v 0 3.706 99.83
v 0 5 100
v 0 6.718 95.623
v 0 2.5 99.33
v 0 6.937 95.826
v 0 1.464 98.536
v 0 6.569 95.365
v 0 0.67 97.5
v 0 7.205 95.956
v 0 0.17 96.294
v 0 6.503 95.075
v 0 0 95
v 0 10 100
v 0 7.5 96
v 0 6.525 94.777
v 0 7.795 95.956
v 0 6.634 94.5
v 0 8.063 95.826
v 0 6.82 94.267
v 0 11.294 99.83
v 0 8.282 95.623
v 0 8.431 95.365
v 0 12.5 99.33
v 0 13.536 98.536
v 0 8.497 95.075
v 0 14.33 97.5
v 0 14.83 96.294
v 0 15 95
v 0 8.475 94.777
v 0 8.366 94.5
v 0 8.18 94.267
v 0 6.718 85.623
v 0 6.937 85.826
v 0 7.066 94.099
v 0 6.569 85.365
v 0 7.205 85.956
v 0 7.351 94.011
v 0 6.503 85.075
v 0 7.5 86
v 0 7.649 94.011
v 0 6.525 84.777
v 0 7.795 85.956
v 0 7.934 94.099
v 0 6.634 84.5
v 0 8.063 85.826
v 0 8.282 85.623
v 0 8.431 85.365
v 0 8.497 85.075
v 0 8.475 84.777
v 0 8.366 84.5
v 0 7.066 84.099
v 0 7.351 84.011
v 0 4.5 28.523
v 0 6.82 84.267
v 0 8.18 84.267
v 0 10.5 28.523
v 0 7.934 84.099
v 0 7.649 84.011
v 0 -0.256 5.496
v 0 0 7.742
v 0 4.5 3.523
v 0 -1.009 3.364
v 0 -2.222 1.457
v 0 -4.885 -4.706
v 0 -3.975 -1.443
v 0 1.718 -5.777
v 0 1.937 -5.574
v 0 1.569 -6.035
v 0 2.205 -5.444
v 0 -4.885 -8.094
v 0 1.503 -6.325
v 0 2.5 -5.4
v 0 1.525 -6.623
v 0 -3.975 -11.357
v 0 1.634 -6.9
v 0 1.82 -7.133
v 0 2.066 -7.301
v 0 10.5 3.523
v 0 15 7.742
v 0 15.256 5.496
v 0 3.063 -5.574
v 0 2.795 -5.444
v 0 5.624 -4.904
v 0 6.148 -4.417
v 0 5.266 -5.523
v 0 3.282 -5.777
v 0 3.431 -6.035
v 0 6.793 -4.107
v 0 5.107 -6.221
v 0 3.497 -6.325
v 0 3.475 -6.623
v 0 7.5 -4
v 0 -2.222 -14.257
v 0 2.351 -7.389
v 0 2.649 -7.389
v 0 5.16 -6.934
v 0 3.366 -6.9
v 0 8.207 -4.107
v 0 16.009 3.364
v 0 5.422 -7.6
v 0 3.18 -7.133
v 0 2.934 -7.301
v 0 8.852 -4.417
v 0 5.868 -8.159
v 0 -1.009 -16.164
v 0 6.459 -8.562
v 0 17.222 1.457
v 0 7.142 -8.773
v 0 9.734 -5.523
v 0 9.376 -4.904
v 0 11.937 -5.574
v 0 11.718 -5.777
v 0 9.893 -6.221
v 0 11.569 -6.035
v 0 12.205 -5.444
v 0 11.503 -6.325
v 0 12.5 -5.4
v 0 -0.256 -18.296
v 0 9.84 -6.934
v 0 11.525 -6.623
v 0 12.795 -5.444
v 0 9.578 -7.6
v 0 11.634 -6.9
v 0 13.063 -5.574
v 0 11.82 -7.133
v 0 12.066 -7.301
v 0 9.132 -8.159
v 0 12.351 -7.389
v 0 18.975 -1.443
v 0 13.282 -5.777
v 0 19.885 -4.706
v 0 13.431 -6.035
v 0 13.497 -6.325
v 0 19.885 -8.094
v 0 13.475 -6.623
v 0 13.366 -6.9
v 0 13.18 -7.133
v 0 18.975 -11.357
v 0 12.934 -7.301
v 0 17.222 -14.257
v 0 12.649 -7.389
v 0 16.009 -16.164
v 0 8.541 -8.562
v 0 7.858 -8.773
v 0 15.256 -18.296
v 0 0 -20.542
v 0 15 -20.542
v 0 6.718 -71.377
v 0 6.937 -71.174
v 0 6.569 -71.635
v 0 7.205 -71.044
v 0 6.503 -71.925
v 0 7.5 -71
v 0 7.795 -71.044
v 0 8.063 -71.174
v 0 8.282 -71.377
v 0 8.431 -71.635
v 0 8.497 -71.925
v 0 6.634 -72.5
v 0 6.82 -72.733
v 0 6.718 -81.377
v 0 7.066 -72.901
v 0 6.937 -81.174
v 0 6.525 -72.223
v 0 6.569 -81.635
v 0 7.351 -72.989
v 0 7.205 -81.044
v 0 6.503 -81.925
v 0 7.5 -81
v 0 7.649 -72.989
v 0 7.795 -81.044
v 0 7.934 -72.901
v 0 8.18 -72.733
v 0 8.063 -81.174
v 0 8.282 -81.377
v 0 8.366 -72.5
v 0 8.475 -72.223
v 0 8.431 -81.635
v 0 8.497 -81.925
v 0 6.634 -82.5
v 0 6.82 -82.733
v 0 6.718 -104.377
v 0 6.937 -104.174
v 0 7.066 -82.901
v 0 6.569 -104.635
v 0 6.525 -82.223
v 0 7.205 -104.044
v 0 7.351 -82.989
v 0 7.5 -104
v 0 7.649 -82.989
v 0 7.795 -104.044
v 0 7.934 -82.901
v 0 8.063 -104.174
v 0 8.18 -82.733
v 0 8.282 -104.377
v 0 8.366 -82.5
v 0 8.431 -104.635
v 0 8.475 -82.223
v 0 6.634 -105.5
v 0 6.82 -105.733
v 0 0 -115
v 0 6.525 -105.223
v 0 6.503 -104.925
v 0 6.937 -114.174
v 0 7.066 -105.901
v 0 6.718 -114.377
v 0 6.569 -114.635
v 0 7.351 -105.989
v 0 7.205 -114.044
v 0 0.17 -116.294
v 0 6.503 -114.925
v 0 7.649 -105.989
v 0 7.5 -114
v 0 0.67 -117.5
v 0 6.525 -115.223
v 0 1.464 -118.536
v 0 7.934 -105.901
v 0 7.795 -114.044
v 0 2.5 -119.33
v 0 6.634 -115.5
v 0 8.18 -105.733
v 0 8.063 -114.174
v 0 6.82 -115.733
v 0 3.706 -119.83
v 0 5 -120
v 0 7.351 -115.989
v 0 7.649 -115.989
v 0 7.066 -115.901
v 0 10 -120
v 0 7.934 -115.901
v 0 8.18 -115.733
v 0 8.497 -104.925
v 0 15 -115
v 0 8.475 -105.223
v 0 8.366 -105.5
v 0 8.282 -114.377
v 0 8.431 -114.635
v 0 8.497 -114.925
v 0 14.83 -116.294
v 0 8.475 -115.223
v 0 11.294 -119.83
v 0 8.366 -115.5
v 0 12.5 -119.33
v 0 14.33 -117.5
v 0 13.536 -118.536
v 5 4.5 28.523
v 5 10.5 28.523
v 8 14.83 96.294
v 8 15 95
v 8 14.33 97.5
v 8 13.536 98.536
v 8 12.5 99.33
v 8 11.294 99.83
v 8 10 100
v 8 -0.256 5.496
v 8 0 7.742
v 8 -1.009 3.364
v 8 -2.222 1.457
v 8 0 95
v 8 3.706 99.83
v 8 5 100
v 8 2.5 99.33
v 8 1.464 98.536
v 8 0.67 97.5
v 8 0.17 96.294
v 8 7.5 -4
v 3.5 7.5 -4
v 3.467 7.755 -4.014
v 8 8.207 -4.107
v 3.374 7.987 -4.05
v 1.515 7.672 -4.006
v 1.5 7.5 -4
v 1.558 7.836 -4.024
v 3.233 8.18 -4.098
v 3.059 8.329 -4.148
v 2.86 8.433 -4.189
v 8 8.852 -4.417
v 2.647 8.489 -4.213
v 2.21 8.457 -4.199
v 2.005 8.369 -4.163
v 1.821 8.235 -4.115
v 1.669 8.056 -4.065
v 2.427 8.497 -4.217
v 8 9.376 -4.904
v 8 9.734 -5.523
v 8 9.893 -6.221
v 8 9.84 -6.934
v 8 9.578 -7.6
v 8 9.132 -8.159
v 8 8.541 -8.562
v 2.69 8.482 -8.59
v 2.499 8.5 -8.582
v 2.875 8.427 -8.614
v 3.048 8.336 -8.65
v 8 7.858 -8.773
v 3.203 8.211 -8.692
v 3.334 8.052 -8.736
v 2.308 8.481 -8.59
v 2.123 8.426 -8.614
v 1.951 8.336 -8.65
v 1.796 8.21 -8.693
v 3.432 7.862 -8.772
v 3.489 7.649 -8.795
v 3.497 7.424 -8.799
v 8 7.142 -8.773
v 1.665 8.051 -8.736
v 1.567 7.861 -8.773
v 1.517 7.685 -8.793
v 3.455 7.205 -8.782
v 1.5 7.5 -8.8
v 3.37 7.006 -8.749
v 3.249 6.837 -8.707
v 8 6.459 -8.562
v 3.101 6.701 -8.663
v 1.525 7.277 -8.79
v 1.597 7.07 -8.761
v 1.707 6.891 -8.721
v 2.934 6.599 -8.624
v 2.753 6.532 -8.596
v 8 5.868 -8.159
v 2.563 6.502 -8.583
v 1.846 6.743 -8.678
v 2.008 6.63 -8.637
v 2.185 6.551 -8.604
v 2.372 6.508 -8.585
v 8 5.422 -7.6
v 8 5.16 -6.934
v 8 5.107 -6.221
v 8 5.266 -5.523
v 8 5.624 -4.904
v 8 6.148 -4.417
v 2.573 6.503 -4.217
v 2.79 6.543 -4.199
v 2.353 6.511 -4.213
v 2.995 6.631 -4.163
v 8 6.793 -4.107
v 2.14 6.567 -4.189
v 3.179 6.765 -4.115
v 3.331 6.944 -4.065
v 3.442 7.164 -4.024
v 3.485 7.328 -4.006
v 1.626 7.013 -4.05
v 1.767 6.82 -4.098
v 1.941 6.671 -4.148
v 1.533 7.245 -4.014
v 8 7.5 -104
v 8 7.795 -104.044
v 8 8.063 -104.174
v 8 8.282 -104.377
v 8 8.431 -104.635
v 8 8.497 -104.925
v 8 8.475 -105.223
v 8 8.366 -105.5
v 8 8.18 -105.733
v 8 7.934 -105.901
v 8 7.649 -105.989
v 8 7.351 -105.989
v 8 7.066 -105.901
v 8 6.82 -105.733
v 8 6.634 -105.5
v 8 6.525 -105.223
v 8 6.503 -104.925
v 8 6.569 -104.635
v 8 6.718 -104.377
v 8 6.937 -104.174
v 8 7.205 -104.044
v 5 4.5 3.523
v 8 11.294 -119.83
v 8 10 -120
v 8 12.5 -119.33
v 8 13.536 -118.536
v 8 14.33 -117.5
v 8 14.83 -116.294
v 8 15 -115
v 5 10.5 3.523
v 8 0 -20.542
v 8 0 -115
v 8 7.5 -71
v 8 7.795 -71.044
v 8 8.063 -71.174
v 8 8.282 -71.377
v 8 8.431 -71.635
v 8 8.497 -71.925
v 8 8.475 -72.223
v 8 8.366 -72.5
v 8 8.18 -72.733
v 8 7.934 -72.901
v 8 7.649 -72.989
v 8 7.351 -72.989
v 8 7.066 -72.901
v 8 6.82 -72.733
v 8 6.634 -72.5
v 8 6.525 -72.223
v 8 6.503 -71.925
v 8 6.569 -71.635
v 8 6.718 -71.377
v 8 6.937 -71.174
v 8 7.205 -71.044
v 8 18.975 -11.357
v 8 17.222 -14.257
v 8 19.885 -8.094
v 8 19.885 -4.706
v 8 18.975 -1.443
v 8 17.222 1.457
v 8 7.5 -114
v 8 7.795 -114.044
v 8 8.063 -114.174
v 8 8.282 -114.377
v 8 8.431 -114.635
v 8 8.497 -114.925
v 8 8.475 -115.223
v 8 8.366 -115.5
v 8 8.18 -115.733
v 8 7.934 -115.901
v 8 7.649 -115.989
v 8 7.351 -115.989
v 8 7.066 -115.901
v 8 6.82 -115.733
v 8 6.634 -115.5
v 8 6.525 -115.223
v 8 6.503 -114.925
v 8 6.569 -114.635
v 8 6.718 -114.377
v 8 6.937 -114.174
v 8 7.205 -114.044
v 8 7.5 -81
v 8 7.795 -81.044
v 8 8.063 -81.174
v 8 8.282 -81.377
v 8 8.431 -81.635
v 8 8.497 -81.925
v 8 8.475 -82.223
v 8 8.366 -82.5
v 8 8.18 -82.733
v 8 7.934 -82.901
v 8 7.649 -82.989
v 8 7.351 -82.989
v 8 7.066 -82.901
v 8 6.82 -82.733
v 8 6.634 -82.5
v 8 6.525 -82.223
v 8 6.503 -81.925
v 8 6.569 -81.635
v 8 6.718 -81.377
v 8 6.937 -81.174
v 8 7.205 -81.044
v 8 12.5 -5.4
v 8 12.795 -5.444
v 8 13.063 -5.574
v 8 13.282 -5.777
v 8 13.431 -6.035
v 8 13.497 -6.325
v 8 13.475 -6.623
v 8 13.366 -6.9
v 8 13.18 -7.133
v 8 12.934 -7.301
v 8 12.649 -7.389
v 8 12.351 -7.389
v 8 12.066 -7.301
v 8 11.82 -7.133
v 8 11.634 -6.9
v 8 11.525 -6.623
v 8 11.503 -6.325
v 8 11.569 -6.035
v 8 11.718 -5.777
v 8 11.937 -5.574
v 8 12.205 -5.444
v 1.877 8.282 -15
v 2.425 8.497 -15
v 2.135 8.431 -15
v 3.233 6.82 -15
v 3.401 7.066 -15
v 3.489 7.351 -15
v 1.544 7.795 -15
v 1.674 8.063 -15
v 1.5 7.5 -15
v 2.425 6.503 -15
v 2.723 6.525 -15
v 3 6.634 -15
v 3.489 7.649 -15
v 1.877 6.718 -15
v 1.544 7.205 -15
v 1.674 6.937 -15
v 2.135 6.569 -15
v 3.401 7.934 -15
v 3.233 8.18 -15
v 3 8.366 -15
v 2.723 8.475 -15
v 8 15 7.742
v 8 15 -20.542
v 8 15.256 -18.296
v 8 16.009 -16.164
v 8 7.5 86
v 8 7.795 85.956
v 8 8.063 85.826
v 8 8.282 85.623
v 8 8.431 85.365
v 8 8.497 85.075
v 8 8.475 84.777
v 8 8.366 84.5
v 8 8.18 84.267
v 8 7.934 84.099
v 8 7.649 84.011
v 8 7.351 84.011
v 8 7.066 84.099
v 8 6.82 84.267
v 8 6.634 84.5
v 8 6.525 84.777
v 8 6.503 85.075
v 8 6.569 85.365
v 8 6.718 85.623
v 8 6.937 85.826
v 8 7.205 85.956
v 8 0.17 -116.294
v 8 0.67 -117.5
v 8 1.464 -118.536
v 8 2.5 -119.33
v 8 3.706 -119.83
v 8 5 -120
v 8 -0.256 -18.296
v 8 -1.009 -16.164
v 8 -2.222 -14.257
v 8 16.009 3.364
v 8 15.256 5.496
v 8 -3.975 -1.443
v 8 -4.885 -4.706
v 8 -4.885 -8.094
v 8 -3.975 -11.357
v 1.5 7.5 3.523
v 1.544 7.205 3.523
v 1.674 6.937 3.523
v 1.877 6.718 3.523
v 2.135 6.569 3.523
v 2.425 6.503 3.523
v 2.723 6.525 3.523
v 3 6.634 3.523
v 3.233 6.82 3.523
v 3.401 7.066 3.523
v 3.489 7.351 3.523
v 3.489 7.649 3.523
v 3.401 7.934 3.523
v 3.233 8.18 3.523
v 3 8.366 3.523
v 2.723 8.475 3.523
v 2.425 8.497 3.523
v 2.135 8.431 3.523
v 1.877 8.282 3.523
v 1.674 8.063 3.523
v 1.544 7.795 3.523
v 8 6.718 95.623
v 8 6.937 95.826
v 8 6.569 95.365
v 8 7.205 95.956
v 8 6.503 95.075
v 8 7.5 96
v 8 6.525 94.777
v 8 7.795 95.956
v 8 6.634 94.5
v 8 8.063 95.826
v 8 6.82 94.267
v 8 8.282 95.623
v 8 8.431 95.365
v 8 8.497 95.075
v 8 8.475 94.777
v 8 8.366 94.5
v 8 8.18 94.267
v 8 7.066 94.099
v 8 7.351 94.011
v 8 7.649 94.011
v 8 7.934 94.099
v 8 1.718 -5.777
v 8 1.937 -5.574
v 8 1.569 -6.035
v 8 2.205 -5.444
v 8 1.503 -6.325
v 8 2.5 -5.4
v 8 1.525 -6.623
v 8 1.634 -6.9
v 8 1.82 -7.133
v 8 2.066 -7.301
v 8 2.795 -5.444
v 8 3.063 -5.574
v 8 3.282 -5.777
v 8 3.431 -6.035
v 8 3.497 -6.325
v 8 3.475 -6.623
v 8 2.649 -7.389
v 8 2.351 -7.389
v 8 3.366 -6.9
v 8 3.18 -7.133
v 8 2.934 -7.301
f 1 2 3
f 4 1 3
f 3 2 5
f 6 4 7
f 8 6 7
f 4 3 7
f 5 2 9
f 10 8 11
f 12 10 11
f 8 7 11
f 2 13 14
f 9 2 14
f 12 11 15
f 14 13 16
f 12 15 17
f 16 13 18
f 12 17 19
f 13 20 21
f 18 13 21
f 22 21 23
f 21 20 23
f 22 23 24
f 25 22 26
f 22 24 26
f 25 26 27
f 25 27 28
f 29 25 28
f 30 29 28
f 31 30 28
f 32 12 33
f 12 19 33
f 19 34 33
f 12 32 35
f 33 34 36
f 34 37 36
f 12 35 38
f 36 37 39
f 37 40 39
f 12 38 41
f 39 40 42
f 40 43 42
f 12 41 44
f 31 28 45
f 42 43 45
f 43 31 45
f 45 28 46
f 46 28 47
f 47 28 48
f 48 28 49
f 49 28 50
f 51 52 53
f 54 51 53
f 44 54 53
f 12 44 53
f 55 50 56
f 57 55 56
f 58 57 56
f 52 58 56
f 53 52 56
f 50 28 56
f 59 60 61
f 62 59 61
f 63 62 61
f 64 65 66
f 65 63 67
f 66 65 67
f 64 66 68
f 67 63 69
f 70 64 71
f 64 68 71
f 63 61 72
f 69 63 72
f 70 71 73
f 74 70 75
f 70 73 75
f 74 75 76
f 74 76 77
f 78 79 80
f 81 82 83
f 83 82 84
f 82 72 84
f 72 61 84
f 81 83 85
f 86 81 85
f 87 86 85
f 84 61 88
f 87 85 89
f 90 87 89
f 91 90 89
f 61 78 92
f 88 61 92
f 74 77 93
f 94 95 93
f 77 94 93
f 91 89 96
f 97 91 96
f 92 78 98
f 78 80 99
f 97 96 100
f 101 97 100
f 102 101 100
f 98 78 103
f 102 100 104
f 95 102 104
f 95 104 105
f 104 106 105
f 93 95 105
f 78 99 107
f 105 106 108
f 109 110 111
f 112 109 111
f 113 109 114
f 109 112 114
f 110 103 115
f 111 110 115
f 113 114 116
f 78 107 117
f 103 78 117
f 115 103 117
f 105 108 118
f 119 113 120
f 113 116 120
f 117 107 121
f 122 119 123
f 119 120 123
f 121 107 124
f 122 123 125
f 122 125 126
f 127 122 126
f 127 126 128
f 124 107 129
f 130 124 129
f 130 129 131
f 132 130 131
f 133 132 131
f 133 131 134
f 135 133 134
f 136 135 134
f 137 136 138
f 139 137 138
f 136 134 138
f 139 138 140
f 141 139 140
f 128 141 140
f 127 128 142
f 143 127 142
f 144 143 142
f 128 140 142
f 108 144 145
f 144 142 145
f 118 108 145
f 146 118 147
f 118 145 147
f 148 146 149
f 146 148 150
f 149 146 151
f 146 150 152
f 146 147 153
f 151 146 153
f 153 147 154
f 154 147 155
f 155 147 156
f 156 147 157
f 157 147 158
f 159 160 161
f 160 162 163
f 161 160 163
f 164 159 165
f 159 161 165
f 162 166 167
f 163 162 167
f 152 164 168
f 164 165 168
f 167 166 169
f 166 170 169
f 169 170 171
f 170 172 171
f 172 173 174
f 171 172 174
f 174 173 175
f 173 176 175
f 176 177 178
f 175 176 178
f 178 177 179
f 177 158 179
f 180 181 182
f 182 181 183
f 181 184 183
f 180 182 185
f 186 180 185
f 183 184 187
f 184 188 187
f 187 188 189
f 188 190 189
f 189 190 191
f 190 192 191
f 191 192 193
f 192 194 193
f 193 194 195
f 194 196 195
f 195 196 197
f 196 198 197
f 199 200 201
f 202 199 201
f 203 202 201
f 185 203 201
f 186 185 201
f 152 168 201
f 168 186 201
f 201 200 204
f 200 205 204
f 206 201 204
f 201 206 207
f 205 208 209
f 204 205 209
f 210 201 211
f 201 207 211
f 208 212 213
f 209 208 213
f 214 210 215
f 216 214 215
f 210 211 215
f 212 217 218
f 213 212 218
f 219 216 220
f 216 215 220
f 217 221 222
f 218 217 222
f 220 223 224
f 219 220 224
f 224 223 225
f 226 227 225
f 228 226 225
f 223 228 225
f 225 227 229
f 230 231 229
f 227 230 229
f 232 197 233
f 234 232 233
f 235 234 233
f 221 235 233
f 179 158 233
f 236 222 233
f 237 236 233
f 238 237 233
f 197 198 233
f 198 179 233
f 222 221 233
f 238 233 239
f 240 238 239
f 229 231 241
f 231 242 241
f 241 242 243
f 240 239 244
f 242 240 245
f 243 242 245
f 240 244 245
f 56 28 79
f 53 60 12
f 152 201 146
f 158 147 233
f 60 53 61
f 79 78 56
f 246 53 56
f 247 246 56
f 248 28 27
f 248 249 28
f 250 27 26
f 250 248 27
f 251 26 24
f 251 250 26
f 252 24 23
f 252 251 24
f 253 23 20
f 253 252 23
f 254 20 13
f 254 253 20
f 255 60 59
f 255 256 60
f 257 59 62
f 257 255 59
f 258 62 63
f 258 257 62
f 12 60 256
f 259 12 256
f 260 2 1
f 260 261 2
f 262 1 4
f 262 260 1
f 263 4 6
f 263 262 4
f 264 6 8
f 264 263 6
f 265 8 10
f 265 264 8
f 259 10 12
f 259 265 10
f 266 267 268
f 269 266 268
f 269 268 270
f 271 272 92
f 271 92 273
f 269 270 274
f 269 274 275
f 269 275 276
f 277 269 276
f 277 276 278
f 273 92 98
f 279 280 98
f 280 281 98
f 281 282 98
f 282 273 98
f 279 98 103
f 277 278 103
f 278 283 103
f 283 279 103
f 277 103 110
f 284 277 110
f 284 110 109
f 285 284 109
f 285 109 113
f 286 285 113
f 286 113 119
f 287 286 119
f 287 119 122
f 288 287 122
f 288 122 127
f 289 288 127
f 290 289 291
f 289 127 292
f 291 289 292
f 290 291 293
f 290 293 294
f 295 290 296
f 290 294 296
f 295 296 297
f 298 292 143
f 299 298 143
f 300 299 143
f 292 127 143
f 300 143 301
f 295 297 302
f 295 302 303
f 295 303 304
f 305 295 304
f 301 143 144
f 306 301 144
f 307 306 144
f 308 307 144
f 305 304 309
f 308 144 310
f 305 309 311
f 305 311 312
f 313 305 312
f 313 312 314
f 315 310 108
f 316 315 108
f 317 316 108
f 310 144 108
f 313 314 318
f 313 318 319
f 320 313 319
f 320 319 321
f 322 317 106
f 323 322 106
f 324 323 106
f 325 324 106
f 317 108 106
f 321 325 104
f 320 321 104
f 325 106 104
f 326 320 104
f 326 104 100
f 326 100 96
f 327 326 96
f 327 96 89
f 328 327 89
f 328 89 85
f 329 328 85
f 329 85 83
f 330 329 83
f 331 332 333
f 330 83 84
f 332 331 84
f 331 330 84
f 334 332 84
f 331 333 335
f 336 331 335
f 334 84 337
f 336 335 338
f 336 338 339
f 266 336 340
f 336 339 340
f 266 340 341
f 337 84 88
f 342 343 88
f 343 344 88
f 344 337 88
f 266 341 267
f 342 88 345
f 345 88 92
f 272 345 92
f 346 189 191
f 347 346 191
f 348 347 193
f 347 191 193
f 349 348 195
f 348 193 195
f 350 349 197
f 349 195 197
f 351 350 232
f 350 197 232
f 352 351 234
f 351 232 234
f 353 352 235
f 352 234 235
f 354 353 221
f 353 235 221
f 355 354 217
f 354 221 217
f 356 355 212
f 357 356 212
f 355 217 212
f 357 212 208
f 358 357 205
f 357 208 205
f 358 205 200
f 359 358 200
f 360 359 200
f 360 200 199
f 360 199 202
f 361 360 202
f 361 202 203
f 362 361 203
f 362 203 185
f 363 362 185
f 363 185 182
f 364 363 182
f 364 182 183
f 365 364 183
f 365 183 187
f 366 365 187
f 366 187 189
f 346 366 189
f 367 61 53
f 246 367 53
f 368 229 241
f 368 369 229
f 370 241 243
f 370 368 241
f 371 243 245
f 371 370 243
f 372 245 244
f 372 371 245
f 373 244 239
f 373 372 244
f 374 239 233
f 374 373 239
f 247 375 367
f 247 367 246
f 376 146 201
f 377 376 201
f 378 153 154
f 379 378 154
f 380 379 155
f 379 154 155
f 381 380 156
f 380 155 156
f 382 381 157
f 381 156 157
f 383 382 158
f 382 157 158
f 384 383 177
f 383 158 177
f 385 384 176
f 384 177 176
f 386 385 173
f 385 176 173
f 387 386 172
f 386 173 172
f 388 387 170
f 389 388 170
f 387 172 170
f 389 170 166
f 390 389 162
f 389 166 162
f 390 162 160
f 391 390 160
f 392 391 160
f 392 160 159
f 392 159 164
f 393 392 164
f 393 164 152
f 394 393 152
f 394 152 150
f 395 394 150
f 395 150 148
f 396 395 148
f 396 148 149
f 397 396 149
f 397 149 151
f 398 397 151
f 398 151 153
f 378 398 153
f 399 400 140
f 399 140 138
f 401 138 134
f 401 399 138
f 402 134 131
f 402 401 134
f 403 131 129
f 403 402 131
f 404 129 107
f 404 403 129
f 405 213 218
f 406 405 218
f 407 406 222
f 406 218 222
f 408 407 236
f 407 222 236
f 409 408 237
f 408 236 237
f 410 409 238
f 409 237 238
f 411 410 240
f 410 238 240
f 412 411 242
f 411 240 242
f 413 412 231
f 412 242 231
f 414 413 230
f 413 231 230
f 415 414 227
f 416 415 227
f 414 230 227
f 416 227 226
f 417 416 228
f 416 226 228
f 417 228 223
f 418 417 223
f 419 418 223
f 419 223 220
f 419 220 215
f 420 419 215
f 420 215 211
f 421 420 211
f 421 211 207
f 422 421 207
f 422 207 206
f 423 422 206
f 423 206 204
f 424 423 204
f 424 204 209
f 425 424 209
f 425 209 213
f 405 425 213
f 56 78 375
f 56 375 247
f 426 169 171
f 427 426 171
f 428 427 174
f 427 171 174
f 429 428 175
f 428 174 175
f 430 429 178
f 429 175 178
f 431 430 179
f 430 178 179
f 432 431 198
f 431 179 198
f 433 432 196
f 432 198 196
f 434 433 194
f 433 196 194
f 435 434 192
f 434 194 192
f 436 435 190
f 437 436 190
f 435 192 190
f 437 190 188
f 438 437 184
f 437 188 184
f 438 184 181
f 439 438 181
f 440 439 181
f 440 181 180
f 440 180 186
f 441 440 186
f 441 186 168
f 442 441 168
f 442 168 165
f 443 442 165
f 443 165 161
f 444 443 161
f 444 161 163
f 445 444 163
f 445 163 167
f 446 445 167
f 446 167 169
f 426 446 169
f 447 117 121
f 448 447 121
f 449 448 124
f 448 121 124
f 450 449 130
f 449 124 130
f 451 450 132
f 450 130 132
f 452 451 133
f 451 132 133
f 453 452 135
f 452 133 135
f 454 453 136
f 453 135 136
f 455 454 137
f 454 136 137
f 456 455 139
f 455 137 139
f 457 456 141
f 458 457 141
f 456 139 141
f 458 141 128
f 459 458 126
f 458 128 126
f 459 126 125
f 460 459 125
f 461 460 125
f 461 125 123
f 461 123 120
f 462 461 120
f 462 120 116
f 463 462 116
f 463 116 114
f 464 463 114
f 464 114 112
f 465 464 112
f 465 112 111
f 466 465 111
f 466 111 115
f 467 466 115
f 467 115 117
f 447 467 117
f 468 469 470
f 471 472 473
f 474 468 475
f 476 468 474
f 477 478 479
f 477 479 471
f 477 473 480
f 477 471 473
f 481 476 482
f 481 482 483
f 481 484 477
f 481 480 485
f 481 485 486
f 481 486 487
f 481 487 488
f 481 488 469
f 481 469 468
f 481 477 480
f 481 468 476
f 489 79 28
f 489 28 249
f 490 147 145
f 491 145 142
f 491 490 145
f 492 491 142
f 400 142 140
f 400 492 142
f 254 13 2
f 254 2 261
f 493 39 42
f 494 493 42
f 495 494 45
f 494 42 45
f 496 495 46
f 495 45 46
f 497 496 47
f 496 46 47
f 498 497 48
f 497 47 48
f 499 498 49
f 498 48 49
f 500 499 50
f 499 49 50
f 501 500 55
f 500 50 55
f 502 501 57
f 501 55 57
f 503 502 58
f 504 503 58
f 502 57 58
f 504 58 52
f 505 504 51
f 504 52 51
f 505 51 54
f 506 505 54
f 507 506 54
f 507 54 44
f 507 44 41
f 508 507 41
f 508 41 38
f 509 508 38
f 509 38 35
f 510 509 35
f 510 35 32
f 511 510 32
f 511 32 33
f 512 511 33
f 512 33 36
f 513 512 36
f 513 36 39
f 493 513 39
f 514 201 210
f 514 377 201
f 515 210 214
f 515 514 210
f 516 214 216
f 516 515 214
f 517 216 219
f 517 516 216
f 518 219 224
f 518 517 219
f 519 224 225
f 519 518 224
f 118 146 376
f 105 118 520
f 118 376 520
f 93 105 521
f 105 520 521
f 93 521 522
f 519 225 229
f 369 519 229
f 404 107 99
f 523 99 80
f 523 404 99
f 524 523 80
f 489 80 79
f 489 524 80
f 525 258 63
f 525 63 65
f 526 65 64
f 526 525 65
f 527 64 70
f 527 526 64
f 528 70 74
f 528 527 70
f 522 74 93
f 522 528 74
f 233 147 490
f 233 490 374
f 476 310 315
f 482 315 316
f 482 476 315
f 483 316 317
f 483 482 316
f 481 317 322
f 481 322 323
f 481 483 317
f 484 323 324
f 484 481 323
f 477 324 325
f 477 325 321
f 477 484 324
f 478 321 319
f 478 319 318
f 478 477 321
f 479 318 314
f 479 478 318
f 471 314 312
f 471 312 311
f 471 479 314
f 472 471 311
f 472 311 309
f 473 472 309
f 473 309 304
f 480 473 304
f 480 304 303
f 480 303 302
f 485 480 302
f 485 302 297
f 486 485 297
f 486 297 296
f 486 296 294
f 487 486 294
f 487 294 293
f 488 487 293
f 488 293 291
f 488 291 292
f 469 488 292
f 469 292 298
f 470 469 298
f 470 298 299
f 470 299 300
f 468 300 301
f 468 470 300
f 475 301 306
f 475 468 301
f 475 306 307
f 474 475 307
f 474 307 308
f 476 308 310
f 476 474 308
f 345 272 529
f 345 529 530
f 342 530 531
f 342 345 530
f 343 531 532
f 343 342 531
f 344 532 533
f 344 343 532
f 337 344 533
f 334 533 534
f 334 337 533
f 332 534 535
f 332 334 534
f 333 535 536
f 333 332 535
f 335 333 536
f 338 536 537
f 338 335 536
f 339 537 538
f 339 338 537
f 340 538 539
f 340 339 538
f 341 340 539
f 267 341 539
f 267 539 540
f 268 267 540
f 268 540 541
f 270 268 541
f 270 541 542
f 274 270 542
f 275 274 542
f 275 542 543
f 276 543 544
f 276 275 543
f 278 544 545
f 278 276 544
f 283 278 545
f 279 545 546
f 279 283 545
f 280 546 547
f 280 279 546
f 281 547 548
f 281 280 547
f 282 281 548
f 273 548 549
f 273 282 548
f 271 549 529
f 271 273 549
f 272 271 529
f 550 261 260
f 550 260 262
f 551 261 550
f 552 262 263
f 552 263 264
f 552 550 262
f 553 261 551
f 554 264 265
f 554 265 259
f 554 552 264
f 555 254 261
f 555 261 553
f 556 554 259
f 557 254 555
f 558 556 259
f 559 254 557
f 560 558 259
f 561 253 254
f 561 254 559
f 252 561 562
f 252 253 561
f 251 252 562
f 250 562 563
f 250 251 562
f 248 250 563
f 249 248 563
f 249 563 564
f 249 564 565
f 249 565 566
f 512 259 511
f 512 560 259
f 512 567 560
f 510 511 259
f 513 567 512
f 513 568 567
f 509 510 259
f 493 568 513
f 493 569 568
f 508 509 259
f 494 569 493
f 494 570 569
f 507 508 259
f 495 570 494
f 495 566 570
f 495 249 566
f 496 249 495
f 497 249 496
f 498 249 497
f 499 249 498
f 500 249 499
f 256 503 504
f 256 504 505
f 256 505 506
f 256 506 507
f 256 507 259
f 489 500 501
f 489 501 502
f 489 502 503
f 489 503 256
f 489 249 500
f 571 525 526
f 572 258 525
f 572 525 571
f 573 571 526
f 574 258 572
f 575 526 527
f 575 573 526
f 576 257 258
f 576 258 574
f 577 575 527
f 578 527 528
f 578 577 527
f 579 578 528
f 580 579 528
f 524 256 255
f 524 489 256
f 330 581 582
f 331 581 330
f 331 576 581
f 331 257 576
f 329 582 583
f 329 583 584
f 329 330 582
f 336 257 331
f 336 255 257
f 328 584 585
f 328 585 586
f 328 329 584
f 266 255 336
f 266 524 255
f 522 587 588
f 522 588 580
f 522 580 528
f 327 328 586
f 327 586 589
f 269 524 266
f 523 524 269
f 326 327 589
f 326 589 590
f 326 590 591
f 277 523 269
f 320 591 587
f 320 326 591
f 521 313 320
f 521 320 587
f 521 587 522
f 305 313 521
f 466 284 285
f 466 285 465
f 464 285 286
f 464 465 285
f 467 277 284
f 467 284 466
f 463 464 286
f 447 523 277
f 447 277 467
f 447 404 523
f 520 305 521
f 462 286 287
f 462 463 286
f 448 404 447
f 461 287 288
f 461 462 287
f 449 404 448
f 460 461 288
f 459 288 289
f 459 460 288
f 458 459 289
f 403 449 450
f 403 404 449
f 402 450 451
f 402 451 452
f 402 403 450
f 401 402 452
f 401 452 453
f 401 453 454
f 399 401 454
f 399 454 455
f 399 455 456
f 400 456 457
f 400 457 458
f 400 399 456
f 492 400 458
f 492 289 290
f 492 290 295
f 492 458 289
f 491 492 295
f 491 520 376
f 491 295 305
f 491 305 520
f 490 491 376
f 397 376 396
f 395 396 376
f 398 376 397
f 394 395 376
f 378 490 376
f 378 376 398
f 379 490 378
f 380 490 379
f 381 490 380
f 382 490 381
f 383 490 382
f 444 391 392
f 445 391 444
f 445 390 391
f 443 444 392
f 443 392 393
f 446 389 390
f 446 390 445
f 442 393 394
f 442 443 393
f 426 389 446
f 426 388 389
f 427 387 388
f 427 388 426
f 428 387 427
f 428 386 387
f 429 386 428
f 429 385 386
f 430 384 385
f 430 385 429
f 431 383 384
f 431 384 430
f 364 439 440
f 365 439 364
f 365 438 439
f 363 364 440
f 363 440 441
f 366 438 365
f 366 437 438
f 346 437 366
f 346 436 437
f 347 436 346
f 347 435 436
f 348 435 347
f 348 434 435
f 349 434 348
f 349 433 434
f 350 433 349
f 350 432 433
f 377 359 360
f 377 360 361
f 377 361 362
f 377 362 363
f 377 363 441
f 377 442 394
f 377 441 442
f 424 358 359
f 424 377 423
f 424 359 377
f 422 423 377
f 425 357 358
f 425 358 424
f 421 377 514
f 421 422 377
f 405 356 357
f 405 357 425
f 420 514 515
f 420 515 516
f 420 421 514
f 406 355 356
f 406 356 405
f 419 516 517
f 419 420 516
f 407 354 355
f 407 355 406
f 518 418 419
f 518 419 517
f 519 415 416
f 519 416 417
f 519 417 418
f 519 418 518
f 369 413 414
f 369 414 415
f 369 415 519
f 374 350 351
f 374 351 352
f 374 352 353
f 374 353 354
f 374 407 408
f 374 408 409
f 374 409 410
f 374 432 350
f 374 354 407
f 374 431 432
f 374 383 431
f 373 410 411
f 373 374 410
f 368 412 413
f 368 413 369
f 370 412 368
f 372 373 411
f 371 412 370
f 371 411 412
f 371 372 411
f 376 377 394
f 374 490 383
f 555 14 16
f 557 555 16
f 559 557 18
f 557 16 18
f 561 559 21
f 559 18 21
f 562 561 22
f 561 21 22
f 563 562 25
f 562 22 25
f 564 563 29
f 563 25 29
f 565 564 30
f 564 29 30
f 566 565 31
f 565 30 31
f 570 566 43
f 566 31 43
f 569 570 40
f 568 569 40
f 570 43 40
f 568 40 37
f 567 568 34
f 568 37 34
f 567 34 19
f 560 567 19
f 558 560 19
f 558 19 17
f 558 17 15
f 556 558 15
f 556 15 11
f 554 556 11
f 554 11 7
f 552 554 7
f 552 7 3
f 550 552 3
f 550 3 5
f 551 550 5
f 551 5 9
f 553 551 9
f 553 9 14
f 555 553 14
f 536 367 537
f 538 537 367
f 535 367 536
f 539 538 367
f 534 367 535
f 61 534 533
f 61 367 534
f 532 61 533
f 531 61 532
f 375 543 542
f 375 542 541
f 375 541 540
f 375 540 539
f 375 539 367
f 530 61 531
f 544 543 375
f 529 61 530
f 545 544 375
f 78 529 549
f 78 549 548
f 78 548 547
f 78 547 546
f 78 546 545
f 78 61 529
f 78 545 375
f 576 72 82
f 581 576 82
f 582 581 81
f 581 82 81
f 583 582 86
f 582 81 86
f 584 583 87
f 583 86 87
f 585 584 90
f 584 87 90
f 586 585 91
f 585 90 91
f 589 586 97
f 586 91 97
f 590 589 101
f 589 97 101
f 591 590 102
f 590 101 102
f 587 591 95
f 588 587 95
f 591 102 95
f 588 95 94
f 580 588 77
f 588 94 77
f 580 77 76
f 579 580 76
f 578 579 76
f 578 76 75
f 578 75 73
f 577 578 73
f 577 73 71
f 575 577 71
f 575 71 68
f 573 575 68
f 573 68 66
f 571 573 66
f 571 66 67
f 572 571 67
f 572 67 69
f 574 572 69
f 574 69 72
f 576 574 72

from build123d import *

# Parameters (mm, degrees)
SKETCH_1_W               = 120
SKETCH_1_H               = 15
EXTRUDE_1_DEPTH          = 8
FILLET_1_R               = 5
SKETCH_6_R               = 12.5
EXTRUDE_2_DEPTH          = 8
SKETCH_7_R               = 1
CUT_EXTRUDE_4_DEPTH      = 23
SKETCH_8_R               = 2.4
CUT_EXTRUDE_5_DEPTH      = 23
SKETCH_9_W               = 8
SKETCH_9_H               = 15
EXTRUDE_3_DEPTH          = 100
SKETCH_10_W              = 25
SKETCH_10_H              = 6
CUT_EXTRUDE_6_DEPTH      = 5
CUT_EXTRUDE_7_DEPTH      = 7
CUT_EXTRUDE_7_DEPTH_BACK = 15
SKETCH_4_R               = 1
FILLET_2_R               = 10
FILLET_4_R               = 5
CUT_EXTRUDE_8_REACH      = 123.918
SKETCH_12_R              = 1


with BuildPart() as part:
    # 草图1 → 凸台-拉伸1 (new body)
    with BuildSketch(Plane(origin=(0, 0, 0), x_dir=(0, 0, -1), z_dir=(1, 0, 0))):
        with Locations((60, 7.5)):
            Rectangle(SKETCH_1_W, SKETCH_1_H)
    extrude(amount=EXTRUDE_1_DEPTH)

    # 圆角1
    fillet_1_edges = [part.edges().sort_by_distance(p)[0] for p in [
        (4, 15, 0),
        (4, 15, -120),
        (4, 0, -120),
        (4, 0, 0),
    ]]
    fillet(fillet_1_edges, radius=FILLET_1_R)

    # 草图6 → 凸台-拉伸2 (add)
    with BuildSketch(Plane(origin=(8, 0, 0), x_dir=(0, 0, -1), z_dir=(1, 0, 0))):
        with Locations((6.4, 7.5)):
            Circle(SKETCH_6_R)
    extrude(amount=-EXTRUDE_2_DEPTH)

    # 草图7 → 切除-拉伸4 (cut)
    with BuildSketch(Plane.ZY):
        with Locations((-6.4, 12.5)):
            Circle(SKETCH_7_R)
        with Locations((-6.4, 2.5)):
            Circle(SKETCH_7_R)
    extrude(amount=-CUT_EXTRUDE_4_DEPTH, mode=Mode.SUBTRACT)

    # 草图8 → 切除-拉伸5 (cut)
    with BuildSketch(Plane.ZY):
        with Locations((-6.4, 7.5)):
            Circle(SKETCH_8_R)
    extrude(amount=-CUT_EXTRUDE_5_DEPTH, mode=Mode.SUBTRACT)

    # 草图9 → 凸台-拉伸3 (add)
    with BuildSketch(Plane.XY):
        with Locations((4, 7.5)):
            Rectangle(SKETCH_9_W, SKETCH_9_H)
    extrude(amount=EXTRUDE_3_DEPTH)

    # 草图10 → 切除-拉伸6 (cut)
    with BuildSketch(Plane.ZY):
        with Locations((16.022995474, 7.5)):
            Rectangle(SKETCH_10_W, SKETCH_10_H)
    extrude(amount=-CUT_EXTRUDE_6_DEPTH, mode=Mode.SUBTRACT)

    # 草图4 → 切除-拉伸7 (cut, two sides: drawn at the far end of the back side and taken through both)
    with BuildSketch(Plane.XY.offset(-CUT_EXTRUDE_7_DEPTH_BACK)):
        with Locations(Location((2.5, 7.5, 0), (0, 0, 180.000000002))):
            Circle(SKETCH_4_R)
    extrude(amount=CUT_EXTRUDE_7_DEPTH + CUT_EXTRUDE_7_DEPTH_BACK, mode=Mode.SUBTRACT)

    # 圆角2
    fillet_2_edges = [part.edges().sort_by_distance(p)[0] for p in [
        (4, 0, -16.4),
        (4, 15, -16.4),
        (4, 15, 3.6),
        (4, 0, 3.6),
    ]]
    fillet(fillet_2_edges, radius=FILLET_2_R)

    # 圆角4
    fillet_4_edges = [part.edges().sort_by_distance(p)[0] for p in [
        (4, 0, 100),
        (4, 15, 100),
    ]]
    fillet(fillet_4_edges, radius=FILLET_4_R)

    # 草图12 → 切除-拉伸8 (cut, up to next)
    with BuildSketch(Plane.ZY, mode=Mode.PRIVATE) as cut_extrude_8_sk1:
        with Locations((-115, 7.5)):
            Circle(SKETCH_12_R)
    cut_extrude_8_tool1 = extrude(cut_extrude_8_sk1.sketch, amount=-CUT_EXTRUDE_8_REACH, mode=Mode.PRIVATE) & part.part
    # 草图12 → 切除-拉伸8 (cut, up to next)
    with BuildSketch(Plane.ZY, mode=Mode.PRIVATE) as cut_extrude_8_sk2:
        with Locations((-105, 7.5)):
            Circle(SKETCH_12_R)
    cut_extrude_8_tool2 = extrude(cut_extrude_8_sk2.sketch, amount=-CUT_EXTRUDE_8_REACH, mode=Mode.PRIVATE) & part.part
    # 草图12 → 切除-拉伸8 (cut, up to next)
    with BuildSketch(Plane.ZY, mode=Mode.PRIVATE) as cut_extrude_8_sk3:
        with Locations((-82, 7.5)):
            Circle(SKETCH_12_R)
    cut_extrude_8_tool3 = extrude(cut_extrude_8_sk3.sketch, amount=-CUT_EXTRUDE_8_REACH, mode=Mode.PRIVATE) & part.part
    # 草图12 → 切除-拉伸8 (cut, up to next)
    with BuildSketch(Plane.ZY, mode=Mode.PRIVATE) as cut_extrude_8_sk4:
        with Locations((-72, 7.5)):
            Circle(SKETCH_12_R)
    cut_extrude_8_tool4 = extrude(cut_extrude_8_sk4.sketch, amount=-CUT_EXTRUDE_8_REACH, mode=Mode.PRIVATE) & part.part
    # 草图12 → 切除-拉伸8 (cut, up to next)
    with BuildSketch(Plane.ZY, mode=Mode.PRIVATE) as cut_extrude_8_sk5:
        with Locations((95, 7.5)):
            Circle(SKETCH_12_R)
    cut_extrude_8_tool5 = extrude(cut_extrude_8_sk5.sketch, amount=-CUT_EXTRUDE_8_REACH, mode=Mode.PRIVATE) & part.part
    # 草图12 → 切除-拉伸8 (cut, up to next)
    with BuildSketch(Plane.ZY, mode=Mode.PRIVATE) as cut_extrude_8_sk6:
        with Locations((85, 7.5)):
            Circle(SKETCH_12_R)
    cut_extrude_8_tool6 = extrude(cut_extrude_8_sk6.sketch, amount=-CUT_EXTRUDE_8_REACH, mode=Mode.PRIVATE) & part.part
    add(cut_extrude_8_tool1.solids().sort_by_distance((0, 7.5, -115))[0], mode=Mode.SUBTRACT)
    add(cut_extrude_8_tool2.solids().sort_by_distance((0, 7.5, -105))[0], mode=Mode.SUBTRACT)
    add(cut_extrude_8_tool3.solids().sort_by_distance((0, 7.5, -82))[0], mode=Mode.SUBTRACT)
    add(cut_extrude_8_tool4.solids().sort_by_distance((0, 7.5, -72))[0], mode=Mode.SUBTRACT)
    add(cut_extrude_8_tool5.solids().sort_by_distance((0, 7.5, 95))[0], mode=Mode.SUBTRACT)
    add(cut_extrude_8_tool6.solids().sort_by_distance((0, 7.5, 85))[0], mode=Mode.SUBTRACT)


solid = part.part
